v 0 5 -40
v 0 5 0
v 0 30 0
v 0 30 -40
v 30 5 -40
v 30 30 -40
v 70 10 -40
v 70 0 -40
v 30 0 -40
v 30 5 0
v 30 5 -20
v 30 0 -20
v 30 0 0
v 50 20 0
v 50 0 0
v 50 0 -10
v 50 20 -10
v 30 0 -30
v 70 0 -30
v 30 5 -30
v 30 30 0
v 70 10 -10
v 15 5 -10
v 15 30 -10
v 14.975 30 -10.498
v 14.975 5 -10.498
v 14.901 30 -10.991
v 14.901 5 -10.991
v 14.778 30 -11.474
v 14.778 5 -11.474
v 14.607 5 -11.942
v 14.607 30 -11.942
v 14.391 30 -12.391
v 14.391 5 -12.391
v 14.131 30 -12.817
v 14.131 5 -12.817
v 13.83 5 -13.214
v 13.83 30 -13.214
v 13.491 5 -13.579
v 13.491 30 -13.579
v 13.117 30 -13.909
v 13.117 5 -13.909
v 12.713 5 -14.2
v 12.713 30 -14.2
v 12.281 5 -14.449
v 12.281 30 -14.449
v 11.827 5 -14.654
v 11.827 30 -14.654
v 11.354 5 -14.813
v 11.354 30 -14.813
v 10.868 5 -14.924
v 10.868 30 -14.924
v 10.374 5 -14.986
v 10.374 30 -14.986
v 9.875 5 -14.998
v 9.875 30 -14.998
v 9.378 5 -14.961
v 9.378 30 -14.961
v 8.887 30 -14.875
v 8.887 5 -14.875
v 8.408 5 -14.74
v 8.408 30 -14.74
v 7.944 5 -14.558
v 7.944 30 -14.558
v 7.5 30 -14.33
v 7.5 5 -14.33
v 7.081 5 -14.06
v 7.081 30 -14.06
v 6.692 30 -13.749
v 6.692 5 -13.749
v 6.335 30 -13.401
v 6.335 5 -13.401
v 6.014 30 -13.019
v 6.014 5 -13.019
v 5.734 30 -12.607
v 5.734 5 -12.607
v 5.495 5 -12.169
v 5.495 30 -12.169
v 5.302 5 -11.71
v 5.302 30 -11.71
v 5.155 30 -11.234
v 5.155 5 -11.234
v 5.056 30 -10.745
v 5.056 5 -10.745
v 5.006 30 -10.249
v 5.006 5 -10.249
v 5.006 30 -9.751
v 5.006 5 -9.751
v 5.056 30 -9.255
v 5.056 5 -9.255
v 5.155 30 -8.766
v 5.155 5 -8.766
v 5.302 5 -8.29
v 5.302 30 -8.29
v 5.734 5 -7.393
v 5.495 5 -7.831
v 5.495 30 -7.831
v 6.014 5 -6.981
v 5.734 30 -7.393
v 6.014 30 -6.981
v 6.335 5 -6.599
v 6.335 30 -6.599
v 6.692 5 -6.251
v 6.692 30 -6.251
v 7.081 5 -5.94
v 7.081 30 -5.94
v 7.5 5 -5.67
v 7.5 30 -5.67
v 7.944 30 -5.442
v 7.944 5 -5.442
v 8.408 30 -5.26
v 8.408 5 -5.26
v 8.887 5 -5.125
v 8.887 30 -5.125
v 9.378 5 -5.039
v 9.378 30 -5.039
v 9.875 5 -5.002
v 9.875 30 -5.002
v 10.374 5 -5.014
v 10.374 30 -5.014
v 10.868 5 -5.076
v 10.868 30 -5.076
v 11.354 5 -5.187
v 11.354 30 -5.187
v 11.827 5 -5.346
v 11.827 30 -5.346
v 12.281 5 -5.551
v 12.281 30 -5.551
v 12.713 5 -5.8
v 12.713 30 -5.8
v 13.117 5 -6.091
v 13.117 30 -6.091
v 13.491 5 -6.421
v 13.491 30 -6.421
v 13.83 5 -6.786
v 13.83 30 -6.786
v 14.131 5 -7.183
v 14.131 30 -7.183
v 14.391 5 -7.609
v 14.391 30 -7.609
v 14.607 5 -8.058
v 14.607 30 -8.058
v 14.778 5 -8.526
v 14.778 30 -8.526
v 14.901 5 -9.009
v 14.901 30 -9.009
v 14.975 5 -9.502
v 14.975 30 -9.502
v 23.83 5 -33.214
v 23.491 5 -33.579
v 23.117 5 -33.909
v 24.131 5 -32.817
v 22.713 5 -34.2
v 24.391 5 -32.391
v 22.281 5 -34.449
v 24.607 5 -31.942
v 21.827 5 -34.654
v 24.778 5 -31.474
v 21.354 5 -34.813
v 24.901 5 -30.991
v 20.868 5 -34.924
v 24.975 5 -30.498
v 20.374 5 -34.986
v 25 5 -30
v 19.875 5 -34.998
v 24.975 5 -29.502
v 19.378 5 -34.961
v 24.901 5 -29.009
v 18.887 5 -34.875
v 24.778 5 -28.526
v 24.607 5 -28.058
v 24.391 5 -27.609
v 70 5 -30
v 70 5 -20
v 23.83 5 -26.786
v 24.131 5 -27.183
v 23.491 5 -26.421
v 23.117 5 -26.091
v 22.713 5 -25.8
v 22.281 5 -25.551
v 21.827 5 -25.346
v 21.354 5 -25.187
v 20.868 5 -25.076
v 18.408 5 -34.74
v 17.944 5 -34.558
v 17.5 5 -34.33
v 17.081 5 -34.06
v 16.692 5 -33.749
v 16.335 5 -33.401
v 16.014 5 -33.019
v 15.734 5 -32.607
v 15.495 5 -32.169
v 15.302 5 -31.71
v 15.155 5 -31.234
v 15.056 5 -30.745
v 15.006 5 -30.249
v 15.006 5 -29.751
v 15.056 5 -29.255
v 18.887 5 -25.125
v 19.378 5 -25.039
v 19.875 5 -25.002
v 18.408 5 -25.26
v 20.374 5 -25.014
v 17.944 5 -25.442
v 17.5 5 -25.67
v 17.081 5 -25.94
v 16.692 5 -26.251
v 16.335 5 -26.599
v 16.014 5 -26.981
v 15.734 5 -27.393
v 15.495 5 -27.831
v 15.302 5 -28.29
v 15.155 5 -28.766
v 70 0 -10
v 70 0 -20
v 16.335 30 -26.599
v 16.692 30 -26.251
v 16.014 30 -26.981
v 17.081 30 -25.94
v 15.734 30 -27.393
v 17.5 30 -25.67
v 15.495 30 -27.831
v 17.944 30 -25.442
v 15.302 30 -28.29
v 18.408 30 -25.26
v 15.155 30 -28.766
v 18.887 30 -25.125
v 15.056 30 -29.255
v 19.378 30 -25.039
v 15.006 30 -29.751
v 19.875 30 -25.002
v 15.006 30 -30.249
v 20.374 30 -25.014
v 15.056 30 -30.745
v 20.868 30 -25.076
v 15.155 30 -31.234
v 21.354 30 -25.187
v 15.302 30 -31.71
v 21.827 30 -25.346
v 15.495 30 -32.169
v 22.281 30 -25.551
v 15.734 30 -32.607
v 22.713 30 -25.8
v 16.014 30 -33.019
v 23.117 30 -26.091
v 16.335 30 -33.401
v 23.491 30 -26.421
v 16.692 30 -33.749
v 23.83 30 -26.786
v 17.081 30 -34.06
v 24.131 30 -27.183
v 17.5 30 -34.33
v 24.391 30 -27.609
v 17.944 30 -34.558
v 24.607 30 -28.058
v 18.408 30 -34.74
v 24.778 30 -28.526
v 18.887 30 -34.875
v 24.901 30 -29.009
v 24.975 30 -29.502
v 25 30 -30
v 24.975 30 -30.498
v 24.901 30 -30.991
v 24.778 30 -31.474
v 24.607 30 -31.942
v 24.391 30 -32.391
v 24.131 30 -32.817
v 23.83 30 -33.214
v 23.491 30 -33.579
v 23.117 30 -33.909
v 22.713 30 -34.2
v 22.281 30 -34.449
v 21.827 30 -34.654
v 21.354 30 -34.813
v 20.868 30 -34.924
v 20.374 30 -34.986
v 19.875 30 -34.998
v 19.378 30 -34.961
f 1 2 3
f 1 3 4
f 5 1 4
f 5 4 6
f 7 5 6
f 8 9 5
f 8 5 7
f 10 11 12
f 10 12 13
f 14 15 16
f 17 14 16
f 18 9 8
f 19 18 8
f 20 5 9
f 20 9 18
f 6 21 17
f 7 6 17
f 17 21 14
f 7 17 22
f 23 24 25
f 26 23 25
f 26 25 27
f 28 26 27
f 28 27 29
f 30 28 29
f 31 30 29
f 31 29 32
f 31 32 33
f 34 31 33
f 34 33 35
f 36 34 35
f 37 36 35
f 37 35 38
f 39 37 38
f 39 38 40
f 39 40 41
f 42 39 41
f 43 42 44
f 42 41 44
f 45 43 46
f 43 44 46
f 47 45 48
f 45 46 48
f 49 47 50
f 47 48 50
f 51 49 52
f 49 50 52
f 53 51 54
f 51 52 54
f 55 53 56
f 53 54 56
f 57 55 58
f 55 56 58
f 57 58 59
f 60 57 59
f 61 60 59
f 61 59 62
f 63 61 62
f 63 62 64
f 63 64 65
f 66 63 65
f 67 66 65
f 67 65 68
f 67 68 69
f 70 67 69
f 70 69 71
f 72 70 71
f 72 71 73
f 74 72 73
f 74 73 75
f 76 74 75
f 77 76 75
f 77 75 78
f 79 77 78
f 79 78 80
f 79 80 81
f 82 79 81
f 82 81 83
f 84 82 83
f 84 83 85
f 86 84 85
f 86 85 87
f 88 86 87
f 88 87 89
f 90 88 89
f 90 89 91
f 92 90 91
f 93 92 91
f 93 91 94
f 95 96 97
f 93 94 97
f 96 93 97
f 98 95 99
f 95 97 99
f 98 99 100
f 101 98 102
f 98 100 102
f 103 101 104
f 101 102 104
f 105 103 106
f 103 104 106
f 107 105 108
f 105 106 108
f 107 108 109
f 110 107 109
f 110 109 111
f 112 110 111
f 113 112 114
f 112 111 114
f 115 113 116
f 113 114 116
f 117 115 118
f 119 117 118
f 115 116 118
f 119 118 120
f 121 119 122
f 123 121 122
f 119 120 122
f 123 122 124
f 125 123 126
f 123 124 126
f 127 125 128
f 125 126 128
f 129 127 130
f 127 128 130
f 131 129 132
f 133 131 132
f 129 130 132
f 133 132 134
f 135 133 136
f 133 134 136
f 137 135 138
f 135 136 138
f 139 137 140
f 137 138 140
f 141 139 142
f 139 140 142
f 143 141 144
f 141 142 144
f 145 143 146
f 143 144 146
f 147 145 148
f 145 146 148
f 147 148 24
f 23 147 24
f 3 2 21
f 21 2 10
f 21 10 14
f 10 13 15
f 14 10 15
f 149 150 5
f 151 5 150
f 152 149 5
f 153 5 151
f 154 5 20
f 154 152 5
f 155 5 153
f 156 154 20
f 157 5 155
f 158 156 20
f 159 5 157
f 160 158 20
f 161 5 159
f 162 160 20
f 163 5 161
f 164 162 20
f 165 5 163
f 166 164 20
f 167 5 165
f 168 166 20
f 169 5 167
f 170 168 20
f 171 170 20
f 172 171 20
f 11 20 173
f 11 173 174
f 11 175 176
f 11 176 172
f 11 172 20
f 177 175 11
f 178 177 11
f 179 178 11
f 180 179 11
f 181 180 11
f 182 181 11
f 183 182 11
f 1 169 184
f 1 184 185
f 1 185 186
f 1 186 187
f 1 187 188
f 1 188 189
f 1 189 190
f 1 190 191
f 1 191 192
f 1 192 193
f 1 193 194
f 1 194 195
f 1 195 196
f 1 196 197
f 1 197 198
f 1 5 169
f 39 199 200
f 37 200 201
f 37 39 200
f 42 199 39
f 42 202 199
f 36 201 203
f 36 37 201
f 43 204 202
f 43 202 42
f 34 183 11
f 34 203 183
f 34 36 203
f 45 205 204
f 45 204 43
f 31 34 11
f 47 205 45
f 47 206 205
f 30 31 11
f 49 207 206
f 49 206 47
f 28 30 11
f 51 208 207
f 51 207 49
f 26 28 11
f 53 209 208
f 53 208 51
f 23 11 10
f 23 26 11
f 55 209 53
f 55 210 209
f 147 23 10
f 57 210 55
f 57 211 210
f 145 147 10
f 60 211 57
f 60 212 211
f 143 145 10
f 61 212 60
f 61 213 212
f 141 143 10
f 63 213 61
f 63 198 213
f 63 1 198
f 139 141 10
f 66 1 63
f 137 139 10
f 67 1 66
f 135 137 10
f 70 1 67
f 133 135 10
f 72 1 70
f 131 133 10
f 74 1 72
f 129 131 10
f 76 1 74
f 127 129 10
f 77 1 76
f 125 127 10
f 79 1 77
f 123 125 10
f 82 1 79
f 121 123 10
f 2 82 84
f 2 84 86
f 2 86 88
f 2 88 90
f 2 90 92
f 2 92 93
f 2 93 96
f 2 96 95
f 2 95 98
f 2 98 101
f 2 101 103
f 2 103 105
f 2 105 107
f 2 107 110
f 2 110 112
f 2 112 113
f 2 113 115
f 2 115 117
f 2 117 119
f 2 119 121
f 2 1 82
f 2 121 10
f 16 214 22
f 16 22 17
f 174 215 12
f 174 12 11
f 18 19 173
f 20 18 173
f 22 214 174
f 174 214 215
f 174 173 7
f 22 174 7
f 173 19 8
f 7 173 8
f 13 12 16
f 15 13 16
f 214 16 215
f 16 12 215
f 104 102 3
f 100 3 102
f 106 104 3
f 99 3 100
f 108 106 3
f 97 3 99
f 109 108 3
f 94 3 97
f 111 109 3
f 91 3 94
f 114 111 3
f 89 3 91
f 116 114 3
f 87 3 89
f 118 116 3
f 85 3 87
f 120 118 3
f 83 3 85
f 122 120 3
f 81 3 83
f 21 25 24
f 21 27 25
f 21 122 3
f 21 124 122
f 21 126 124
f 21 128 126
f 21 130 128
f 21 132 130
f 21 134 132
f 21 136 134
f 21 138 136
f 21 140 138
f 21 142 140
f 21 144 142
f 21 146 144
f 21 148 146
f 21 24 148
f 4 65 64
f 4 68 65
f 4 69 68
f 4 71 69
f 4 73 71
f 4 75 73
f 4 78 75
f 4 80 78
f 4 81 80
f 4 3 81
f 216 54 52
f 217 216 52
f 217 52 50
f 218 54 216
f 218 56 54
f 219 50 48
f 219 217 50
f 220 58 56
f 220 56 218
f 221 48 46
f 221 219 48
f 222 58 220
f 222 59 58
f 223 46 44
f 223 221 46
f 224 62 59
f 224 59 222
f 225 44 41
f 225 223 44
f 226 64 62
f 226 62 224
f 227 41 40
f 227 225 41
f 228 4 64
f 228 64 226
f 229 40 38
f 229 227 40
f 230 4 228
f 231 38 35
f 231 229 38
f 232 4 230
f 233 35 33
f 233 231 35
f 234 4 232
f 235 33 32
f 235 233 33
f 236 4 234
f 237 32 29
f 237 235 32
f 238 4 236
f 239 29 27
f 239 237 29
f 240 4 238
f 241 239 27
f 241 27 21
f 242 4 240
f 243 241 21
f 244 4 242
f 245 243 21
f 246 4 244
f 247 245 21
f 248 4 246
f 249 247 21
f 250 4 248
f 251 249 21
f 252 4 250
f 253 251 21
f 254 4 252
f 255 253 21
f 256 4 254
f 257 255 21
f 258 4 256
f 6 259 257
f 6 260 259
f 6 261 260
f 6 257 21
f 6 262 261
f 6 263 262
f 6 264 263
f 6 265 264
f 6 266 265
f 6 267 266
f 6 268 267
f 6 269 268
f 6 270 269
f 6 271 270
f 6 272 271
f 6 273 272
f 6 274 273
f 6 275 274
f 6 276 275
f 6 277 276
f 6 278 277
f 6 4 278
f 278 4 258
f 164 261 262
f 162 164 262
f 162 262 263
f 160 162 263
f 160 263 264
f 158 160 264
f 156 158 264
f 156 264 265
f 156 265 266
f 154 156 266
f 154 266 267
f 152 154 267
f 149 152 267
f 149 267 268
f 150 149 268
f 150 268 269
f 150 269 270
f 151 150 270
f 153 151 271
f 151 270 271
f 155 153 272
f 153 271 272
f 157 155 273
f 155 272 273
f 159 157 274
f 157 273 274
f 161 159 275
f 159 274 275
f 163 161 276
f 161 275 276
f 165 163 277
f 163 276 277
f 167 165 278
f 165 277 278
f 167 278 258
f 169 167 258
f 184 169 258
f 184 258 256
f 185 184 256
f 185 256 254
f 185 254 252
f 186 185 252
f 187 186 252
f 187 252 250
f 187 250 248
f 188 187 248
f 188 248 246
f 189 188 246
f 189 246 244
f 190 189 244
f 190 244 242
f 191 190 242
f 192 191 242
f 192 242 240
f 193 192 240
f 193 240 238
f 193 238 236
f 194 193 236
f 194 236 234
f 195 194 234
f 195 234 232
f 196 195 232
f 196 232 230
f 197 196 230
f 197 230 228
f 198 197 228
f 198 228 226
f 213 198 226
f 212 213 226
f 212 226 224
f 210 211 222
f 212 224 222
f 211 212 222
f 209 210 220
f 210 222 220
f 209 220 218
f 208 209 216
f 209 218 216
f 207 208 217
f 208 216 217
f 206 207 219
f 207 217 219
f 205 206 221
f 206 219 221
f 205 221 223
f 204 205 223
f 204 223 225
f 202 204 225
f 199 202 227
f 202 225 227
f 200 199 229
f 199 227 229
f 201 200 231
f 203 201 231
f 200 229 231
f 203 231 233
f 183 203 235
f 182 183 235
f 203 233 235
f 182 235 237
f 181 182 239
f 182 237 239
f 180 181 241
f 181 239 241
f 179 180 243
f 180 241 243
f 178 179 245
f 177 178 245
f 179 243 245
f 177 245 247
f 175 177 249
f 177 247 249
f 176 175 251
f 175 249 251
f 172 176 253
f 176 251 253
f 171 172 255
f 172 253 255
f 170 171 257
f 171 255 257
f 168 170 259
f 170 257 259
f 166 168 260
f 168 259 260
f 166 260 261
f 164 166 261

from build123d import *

# Parameters (mm, degrees)
SKETCH2_W           = 70
SKETCH2_H           = 40
BOSS_EXTRUDE1_DEPTH = 30
CUT_EXTRUDE2_DEPTH  = 49
SKETCH5_W           = 20
SKETCH5_H           = 10
CUT_EXTRUDE3_DEPTH  = 49
SKETCH6_W           = 40
SKETCH6_H           = 5
CUT_EXTRUDE4_DEPTH  = 30
SKETCH7_W           = 10
SKETCH7_H           = 5
CUT_EXTRUDE5_DEPTH  = 41
SKETCH8_R           = 5
CUT_EXTRUDE6_DEPTH  = 31
SKETCH9_R           = 5
CUT_EXTRUDE7_DEPTH  = 31


with BuildPart() as part:
    # Sketch2 → Boss-Extrude1 (new body)
    with BuildSketch(Plane(origin=(0, 0, 0), x_dir=(1, 0, 0), z_dir=(0, 1, 0))):
        with Locations((35, 20)):
            Rectangle(SKETCH2_W, SKETCH2_H)
    extrude(amount=BOSS_EXTRUDE1_DEPTH)

    # Sketch4 → Cut-Extrude2 (cut)
    with BuildSketch(Plane.XY):
        Polygon((70, 30), (30, 30), (70, 10), align=None)
    extrude(amount=-CUT_EXTRUDE2_DEPTH, mode=Mode.SUBTRACT)

    # Sketch5 → Cut-Extrude3 (cut)
    with BuildSketch(Plane(origin=(0, 0, 0), x_dir=(-1, 0, 0), z_dir=(0, -1, 0))):
        with Locations((-60, 5)):
            Rectangle(SKETCH5_W, SKETCH5_H)
    extrude(amount=-CUT_EXTRUDE3_DEPTH, mode=Mode.SUBTRACT)

    # Sketch6 → Cut-Extrude4 (cut)
    with BuildSketch(Plane.ZY):
        with Locations((-20, 2.5)):
            Rectangle(SKETCH6_W, SKETCH6_H)
    extrude(amount=-CUT_EXTRUDE4_DEPTH, mode=Mode.SUBTRACT)

    # Sketch7 → Cut-Extrude5 (cut, through all)
    with BuildSketch(Plane.ZY.offset(-30)):
        with Locations((-25, 2.5)):
            Rectangle(SKETCH7_W, SKETCH7_H)
    extrude(amount=-CUT_EXTRUDE5_DEPTH, mode=Mode.SUBTRACT)

    # Sketch8 → Cut-Extrude6 (cut, through all)
    with BuildSketch(Plane(origin=(0, 30, 0), x_dir=(1, 0, 0), z_dir=(0, 1, 0))):
        with Locations((10, 10)):
            Circle(SKETCH8_R)
    extrude(amount=-CUT_EXTRUDE6_DEPTH, mode=Mode.SUBTRACT)

    # Sketch9 → Cut-Extrude7 (cut, through all)
    with BuildSketch(Plane(origin=(0, 30, 0), x_dir=(1, 0, 0), z_dir=(0, 1, 0))):
        with Locations((20, 30)):
            Circle(SKETCH9_R)
    extrude(amount=-CUT_EXTRUDE7_DEPTH, mode=Mode.SUBTRACT)


solid = part.part
